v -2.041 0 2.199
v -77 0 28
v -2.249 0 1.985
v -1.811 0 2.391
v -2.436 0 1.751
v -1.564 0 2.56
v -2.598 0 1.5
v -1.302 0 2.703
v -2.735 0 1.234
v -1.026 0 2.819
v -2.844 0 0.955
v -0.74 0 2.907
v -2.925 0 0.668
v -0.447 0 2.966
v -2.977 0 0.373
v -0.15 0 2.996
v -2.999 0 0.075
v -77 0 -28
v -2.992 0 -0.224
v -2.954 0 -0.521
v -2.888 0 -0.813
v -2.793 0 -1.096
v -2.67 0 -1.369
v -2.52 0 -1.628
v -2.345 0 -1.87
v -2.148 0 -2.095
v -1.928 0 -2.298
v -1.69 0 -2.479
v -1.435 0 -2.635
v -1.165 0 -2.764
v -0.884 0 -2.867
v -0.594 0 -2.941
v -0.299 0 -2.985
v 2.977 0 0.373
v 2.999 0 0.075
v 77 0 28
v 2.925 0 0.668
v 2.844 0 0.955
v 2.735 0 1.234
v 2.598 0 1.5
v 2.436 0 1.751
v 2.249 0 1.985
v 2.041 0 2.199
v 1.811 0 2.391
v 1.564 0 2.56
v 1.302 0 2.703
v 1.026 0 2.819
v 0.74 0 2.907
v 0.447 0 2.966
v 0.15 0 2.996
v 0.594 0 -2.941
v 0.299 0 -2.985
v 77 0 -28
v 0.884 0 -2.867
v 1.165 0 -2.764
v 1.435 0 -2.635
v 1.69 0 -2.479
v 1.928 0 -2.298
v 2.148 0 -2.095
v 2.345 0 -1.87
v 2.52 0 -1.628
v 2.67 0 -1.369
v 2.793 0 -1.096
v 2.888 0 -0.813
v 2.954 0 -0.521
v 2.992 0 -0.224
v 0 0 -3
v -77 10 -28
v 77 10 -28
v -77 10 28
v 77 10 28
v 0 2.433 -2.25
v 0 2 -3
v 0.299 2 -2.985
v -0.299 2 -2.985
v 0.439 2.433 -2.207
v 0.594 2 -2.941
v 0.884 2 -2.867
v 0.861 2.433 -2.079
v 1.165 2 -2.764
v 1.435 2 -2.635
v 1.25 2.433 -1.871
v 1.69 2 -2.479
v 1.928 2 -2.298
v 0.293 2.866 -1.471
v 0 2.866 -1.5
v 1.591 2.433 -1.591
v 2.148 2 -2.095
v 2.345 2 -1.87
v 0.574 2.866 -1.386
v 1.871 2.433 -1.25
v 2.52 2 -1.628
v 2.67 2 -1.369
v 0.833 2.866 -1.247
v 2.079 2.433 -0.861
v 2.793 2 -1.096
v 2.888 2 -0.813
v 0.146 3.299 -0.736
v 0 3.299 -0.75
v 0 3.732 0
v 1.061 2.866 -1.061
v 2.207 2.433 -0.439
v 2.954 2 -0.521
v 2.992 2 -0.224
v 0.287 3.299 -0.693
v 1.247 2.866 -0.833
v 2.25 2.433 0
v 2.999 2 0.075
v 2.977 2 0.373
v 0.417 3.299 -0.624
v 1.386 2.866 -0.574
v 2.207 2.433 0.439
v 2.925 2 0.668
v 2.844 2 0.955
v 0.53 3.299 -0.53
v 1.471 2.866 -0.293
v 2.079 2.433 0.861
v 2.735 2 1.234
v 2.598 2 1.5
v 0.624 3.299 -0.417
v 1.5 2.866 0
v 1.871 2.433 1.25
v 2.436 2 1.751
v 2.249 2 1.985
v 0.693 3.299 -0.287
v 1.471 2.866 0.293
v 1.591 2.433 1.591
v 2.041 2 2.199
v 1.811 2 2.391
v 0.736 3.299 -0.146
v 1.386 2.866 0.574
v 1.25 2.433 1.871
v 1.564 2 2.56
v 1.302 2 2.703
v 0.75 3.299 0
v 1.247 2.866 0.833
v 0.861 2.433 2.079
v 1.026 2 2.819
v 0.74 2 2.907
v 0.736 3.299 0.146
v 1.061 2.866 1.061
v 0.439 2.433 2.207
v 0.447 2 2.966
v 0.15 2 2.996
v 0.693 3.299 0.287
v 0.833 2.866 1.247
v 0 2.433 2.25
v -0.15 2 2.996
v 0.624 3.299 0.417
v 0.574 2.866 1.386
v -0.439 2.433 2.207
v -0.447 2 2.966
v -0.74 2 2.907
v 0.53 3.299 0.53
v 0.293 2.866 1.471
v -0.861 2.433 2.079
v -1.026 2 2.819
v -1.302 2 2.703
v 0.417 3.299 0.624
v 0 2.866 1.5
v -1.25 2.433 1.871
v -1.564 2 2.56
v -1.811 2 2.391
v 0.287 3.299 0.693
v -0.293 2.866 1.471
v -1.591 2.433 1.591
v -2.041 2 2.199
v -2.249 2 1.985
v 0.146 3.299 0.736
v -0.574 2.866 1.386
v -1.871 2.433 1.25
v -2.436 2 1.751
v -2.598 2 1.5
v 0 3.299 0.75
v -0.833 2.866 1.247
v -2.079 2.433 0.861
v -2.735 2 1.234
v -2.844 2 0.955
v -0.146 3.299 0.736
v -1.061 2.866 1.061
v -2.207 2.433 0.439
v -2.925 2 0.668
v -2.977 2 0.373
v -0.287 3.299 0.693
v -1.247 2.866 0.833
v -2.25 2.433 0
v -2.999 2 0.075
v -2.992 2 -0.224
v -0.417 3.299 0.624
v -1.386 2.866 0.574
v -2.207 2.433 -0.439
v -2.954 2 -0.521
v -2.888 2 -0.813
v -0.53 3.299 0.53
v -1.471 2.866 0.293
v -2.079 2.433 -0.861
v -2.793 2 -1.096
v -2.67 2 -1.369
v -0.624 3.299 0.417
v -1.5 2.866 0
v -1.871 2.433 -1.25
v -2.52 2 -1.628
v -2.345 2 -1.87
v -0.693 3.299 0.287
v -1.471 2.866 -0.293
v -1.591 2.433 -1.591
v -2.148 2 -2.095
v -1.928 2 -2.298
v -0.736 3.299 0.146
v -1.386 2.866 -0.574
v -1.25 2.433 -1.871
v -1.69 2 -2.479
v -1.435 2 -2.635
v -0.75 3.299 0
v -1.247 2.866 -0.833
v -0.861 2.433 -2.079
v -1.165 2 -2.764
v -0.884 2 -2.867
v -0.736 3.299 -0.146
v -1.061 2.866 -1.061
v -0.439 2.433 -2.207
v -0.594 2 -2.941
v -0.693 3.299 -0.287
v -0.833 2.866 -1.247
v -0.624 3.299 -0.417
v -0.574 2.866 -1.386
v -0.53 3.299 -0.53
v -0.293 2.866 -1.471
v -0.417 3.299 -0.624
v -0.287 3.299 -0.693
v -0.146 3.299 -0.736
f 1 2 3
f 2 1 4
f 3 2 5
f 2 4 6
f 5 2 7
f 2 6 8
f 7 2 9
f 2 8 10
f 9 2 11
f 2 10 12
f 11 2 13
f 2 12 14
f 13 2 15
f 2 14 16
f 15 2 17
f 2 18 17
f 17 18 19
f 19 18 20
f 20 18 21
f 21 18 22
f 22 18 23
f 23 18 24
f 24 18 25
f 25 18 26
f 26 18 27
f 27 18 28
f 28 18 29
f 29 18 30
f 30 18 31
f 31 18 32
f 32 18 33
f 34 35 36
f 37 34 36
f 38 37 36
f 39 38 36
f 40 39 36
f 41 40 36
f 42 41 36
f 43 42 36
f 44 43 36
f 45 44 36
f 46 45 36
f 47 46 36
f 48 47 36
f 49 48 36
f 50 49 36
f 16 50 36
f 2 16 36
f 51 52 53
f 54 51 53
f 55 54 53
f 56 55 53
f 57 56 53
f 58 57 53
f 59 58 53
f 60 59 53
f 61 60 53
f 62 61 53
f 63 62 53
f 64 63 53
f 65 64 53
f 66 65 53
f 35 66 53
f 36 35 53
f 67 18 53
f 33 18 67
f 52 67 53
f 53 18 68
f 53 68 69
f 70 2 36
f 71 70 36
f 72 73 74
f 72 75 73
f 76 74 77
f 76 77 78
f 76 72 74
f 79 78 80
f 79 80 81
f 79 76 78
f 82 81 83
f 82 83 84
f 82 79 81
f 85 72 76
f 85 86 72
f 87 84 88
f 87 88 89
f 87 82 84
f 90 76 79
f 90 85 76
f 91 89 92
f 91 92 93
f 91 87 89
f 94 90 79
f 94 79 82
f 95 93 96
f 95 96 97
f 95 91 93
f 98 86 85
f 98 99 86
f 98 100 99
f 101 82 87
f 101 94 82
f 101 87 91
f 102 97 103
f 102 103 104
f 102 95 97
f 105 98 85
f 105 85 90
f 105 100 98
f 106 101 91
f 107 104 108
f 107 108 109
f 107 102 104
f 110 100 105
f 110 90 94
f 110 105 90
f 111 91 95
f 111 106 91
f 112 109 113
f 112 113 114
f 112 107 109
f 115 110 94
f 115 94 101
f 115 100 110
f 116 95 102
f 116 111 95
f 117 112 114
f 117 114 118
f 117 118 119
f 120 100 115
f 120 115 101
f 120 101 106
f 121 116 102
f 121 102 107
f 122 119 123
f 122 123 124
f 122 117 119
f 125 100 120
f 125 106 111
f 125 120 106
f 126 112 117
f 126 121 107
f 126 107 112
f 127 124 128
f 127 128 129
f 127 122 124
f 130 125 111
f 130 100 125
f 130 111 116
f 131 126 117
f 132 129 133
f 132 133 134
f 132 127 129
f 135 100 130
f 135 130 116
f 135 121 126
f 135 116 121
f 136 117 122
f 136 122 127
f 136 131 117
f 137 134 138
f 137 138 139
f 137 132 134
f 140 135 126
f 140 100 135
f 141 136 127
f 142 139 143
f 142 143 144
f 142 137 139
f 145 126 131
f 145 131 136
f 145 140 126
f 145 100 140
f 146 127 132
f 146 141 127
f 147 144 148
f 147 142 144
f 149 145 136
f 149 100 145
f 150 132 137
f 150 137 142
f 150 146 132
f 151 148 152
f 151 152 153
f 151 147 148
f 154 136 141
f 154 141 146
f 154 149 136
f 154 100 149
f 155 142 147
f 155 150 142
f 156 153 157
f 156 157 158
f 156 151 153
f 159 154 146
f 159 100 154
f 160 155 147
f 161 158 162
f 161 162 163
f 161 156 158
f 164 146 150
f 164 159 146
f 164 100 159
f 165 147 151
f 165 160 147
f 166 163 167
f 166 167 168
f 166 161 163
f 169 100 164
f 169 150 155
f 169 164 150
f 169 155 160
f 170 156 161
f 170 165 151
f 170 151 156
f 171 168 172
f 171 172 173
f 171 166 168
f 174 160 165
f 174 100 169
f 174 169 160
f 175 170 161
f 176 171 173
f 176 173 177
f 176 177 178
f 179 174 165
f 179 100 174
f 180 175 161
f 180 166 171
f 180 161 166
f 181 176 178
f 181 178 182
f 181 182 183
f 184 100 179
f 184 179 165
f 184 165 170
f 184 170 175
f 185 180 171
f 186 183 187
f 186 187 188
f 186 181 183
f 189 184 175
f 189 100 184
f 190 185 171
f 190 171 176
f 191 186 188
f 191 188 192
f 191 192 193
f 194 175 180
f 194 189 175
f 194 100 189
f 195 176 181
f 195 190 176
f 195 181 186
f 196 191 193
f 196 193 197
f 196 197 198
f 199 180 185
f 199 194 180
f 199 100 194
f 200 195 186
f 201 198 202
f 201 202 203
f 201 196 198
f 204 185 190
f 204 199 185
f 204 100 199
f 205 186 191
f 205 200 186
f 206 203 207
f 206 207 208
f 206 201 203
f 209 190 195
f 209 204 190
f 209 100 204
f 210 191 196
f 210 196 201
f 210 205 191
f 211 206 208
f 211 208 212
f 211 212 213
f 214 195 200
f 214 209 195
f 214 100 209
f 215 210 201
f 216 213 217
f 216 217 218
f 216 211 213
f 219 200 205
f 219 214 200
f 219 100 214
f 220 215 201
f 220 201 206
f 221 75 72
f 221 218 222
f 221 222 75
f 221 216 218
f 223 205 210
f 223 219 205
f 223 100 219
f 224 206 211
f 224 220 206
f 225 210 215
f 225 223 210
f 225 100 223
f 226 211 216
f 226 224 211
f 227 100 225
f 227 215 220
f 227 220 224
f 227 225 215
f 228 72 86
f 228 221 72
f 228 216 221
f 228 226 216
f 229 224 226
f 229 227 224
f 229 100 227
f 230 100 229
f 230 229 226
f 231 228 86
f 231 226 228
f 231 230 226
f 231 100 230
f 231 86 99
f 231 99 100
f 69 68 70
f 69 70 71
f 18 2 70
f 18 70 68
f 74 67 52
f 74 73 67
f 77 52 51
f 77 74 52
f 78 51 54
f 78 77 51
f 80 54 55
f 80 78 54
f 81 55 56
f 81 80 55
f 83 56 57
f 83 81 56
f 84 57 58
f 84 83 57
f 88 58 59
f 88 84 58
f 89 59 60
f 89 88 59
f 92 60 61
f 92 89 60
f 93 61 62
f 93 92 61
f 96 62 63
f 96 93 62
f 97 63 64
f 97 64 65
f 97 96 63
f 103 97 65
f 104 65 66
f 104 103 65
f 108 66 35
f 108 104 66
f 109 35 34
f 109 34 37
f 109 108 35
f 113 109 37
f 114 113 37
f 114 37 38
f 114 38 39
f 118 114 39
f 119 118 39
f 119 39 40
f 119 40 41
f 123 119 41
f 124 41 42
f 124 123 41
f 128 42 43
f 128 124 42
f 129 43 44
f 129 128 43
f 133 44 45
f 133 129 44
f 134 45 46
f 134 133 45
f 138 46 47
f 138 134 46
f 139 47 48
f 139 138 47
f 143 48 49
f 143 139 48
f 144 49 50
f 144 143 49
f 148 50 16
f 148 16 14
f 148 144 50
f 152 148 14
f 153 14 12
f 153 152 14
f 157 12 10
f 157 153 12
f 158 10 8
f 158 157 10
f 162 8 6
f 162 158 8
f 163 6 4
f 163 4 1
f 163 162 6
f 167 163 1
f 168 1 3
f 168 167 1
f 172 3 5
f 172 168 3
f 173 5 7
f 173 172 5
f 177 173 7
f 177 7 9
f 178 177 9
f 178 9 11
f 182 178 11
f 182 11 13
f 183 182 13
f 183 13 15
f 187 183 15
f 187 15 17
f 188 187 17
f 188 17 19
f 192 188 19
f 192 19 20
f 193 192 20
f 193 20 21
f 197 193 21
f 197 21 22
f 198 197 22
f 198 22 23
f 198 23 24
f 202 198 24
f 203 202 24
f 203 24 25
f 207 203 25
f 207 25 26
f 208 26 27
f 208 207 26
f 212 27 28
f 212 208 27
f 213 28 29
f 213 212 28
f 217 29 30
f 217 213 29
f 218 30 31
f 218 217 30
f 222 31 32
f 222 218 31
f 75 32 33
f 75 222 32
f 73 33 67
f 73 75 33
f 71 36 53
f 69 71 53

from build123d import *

# Parameters (mm, degrees)
SKETCH1_W  = 154
SKETCH1_H  = 56
BASE_DEPTH = 10


with BuildPart() as part:
    # Sketch1 → base (new body)
    with BuildSketch(Plane(origin=(0, 0, 0), x_dir=(1, 0, 0), z_dir=(0, 1, 0))):
        Rectangle(SKETCH1_W, SKETCH1_H)
    extrude(amount=BASE_DEPTH)

    # Sketch4 → Cut-Revolve1 (revolve, cut)
    with BuildSketch(Plane(origin=(0, 0, 0), x_dir=(0, 0, -1), z_dir=(1, 0, 0))):
        Polygon((3, 0), (3, 2), (0, 3.732050808), (0, 0), align=None)
    revolve(axis=Axis((0, 3.732050808, 0), (0, -1, 0)), mode=Mode.SUBTRACT)


solid = part.part
